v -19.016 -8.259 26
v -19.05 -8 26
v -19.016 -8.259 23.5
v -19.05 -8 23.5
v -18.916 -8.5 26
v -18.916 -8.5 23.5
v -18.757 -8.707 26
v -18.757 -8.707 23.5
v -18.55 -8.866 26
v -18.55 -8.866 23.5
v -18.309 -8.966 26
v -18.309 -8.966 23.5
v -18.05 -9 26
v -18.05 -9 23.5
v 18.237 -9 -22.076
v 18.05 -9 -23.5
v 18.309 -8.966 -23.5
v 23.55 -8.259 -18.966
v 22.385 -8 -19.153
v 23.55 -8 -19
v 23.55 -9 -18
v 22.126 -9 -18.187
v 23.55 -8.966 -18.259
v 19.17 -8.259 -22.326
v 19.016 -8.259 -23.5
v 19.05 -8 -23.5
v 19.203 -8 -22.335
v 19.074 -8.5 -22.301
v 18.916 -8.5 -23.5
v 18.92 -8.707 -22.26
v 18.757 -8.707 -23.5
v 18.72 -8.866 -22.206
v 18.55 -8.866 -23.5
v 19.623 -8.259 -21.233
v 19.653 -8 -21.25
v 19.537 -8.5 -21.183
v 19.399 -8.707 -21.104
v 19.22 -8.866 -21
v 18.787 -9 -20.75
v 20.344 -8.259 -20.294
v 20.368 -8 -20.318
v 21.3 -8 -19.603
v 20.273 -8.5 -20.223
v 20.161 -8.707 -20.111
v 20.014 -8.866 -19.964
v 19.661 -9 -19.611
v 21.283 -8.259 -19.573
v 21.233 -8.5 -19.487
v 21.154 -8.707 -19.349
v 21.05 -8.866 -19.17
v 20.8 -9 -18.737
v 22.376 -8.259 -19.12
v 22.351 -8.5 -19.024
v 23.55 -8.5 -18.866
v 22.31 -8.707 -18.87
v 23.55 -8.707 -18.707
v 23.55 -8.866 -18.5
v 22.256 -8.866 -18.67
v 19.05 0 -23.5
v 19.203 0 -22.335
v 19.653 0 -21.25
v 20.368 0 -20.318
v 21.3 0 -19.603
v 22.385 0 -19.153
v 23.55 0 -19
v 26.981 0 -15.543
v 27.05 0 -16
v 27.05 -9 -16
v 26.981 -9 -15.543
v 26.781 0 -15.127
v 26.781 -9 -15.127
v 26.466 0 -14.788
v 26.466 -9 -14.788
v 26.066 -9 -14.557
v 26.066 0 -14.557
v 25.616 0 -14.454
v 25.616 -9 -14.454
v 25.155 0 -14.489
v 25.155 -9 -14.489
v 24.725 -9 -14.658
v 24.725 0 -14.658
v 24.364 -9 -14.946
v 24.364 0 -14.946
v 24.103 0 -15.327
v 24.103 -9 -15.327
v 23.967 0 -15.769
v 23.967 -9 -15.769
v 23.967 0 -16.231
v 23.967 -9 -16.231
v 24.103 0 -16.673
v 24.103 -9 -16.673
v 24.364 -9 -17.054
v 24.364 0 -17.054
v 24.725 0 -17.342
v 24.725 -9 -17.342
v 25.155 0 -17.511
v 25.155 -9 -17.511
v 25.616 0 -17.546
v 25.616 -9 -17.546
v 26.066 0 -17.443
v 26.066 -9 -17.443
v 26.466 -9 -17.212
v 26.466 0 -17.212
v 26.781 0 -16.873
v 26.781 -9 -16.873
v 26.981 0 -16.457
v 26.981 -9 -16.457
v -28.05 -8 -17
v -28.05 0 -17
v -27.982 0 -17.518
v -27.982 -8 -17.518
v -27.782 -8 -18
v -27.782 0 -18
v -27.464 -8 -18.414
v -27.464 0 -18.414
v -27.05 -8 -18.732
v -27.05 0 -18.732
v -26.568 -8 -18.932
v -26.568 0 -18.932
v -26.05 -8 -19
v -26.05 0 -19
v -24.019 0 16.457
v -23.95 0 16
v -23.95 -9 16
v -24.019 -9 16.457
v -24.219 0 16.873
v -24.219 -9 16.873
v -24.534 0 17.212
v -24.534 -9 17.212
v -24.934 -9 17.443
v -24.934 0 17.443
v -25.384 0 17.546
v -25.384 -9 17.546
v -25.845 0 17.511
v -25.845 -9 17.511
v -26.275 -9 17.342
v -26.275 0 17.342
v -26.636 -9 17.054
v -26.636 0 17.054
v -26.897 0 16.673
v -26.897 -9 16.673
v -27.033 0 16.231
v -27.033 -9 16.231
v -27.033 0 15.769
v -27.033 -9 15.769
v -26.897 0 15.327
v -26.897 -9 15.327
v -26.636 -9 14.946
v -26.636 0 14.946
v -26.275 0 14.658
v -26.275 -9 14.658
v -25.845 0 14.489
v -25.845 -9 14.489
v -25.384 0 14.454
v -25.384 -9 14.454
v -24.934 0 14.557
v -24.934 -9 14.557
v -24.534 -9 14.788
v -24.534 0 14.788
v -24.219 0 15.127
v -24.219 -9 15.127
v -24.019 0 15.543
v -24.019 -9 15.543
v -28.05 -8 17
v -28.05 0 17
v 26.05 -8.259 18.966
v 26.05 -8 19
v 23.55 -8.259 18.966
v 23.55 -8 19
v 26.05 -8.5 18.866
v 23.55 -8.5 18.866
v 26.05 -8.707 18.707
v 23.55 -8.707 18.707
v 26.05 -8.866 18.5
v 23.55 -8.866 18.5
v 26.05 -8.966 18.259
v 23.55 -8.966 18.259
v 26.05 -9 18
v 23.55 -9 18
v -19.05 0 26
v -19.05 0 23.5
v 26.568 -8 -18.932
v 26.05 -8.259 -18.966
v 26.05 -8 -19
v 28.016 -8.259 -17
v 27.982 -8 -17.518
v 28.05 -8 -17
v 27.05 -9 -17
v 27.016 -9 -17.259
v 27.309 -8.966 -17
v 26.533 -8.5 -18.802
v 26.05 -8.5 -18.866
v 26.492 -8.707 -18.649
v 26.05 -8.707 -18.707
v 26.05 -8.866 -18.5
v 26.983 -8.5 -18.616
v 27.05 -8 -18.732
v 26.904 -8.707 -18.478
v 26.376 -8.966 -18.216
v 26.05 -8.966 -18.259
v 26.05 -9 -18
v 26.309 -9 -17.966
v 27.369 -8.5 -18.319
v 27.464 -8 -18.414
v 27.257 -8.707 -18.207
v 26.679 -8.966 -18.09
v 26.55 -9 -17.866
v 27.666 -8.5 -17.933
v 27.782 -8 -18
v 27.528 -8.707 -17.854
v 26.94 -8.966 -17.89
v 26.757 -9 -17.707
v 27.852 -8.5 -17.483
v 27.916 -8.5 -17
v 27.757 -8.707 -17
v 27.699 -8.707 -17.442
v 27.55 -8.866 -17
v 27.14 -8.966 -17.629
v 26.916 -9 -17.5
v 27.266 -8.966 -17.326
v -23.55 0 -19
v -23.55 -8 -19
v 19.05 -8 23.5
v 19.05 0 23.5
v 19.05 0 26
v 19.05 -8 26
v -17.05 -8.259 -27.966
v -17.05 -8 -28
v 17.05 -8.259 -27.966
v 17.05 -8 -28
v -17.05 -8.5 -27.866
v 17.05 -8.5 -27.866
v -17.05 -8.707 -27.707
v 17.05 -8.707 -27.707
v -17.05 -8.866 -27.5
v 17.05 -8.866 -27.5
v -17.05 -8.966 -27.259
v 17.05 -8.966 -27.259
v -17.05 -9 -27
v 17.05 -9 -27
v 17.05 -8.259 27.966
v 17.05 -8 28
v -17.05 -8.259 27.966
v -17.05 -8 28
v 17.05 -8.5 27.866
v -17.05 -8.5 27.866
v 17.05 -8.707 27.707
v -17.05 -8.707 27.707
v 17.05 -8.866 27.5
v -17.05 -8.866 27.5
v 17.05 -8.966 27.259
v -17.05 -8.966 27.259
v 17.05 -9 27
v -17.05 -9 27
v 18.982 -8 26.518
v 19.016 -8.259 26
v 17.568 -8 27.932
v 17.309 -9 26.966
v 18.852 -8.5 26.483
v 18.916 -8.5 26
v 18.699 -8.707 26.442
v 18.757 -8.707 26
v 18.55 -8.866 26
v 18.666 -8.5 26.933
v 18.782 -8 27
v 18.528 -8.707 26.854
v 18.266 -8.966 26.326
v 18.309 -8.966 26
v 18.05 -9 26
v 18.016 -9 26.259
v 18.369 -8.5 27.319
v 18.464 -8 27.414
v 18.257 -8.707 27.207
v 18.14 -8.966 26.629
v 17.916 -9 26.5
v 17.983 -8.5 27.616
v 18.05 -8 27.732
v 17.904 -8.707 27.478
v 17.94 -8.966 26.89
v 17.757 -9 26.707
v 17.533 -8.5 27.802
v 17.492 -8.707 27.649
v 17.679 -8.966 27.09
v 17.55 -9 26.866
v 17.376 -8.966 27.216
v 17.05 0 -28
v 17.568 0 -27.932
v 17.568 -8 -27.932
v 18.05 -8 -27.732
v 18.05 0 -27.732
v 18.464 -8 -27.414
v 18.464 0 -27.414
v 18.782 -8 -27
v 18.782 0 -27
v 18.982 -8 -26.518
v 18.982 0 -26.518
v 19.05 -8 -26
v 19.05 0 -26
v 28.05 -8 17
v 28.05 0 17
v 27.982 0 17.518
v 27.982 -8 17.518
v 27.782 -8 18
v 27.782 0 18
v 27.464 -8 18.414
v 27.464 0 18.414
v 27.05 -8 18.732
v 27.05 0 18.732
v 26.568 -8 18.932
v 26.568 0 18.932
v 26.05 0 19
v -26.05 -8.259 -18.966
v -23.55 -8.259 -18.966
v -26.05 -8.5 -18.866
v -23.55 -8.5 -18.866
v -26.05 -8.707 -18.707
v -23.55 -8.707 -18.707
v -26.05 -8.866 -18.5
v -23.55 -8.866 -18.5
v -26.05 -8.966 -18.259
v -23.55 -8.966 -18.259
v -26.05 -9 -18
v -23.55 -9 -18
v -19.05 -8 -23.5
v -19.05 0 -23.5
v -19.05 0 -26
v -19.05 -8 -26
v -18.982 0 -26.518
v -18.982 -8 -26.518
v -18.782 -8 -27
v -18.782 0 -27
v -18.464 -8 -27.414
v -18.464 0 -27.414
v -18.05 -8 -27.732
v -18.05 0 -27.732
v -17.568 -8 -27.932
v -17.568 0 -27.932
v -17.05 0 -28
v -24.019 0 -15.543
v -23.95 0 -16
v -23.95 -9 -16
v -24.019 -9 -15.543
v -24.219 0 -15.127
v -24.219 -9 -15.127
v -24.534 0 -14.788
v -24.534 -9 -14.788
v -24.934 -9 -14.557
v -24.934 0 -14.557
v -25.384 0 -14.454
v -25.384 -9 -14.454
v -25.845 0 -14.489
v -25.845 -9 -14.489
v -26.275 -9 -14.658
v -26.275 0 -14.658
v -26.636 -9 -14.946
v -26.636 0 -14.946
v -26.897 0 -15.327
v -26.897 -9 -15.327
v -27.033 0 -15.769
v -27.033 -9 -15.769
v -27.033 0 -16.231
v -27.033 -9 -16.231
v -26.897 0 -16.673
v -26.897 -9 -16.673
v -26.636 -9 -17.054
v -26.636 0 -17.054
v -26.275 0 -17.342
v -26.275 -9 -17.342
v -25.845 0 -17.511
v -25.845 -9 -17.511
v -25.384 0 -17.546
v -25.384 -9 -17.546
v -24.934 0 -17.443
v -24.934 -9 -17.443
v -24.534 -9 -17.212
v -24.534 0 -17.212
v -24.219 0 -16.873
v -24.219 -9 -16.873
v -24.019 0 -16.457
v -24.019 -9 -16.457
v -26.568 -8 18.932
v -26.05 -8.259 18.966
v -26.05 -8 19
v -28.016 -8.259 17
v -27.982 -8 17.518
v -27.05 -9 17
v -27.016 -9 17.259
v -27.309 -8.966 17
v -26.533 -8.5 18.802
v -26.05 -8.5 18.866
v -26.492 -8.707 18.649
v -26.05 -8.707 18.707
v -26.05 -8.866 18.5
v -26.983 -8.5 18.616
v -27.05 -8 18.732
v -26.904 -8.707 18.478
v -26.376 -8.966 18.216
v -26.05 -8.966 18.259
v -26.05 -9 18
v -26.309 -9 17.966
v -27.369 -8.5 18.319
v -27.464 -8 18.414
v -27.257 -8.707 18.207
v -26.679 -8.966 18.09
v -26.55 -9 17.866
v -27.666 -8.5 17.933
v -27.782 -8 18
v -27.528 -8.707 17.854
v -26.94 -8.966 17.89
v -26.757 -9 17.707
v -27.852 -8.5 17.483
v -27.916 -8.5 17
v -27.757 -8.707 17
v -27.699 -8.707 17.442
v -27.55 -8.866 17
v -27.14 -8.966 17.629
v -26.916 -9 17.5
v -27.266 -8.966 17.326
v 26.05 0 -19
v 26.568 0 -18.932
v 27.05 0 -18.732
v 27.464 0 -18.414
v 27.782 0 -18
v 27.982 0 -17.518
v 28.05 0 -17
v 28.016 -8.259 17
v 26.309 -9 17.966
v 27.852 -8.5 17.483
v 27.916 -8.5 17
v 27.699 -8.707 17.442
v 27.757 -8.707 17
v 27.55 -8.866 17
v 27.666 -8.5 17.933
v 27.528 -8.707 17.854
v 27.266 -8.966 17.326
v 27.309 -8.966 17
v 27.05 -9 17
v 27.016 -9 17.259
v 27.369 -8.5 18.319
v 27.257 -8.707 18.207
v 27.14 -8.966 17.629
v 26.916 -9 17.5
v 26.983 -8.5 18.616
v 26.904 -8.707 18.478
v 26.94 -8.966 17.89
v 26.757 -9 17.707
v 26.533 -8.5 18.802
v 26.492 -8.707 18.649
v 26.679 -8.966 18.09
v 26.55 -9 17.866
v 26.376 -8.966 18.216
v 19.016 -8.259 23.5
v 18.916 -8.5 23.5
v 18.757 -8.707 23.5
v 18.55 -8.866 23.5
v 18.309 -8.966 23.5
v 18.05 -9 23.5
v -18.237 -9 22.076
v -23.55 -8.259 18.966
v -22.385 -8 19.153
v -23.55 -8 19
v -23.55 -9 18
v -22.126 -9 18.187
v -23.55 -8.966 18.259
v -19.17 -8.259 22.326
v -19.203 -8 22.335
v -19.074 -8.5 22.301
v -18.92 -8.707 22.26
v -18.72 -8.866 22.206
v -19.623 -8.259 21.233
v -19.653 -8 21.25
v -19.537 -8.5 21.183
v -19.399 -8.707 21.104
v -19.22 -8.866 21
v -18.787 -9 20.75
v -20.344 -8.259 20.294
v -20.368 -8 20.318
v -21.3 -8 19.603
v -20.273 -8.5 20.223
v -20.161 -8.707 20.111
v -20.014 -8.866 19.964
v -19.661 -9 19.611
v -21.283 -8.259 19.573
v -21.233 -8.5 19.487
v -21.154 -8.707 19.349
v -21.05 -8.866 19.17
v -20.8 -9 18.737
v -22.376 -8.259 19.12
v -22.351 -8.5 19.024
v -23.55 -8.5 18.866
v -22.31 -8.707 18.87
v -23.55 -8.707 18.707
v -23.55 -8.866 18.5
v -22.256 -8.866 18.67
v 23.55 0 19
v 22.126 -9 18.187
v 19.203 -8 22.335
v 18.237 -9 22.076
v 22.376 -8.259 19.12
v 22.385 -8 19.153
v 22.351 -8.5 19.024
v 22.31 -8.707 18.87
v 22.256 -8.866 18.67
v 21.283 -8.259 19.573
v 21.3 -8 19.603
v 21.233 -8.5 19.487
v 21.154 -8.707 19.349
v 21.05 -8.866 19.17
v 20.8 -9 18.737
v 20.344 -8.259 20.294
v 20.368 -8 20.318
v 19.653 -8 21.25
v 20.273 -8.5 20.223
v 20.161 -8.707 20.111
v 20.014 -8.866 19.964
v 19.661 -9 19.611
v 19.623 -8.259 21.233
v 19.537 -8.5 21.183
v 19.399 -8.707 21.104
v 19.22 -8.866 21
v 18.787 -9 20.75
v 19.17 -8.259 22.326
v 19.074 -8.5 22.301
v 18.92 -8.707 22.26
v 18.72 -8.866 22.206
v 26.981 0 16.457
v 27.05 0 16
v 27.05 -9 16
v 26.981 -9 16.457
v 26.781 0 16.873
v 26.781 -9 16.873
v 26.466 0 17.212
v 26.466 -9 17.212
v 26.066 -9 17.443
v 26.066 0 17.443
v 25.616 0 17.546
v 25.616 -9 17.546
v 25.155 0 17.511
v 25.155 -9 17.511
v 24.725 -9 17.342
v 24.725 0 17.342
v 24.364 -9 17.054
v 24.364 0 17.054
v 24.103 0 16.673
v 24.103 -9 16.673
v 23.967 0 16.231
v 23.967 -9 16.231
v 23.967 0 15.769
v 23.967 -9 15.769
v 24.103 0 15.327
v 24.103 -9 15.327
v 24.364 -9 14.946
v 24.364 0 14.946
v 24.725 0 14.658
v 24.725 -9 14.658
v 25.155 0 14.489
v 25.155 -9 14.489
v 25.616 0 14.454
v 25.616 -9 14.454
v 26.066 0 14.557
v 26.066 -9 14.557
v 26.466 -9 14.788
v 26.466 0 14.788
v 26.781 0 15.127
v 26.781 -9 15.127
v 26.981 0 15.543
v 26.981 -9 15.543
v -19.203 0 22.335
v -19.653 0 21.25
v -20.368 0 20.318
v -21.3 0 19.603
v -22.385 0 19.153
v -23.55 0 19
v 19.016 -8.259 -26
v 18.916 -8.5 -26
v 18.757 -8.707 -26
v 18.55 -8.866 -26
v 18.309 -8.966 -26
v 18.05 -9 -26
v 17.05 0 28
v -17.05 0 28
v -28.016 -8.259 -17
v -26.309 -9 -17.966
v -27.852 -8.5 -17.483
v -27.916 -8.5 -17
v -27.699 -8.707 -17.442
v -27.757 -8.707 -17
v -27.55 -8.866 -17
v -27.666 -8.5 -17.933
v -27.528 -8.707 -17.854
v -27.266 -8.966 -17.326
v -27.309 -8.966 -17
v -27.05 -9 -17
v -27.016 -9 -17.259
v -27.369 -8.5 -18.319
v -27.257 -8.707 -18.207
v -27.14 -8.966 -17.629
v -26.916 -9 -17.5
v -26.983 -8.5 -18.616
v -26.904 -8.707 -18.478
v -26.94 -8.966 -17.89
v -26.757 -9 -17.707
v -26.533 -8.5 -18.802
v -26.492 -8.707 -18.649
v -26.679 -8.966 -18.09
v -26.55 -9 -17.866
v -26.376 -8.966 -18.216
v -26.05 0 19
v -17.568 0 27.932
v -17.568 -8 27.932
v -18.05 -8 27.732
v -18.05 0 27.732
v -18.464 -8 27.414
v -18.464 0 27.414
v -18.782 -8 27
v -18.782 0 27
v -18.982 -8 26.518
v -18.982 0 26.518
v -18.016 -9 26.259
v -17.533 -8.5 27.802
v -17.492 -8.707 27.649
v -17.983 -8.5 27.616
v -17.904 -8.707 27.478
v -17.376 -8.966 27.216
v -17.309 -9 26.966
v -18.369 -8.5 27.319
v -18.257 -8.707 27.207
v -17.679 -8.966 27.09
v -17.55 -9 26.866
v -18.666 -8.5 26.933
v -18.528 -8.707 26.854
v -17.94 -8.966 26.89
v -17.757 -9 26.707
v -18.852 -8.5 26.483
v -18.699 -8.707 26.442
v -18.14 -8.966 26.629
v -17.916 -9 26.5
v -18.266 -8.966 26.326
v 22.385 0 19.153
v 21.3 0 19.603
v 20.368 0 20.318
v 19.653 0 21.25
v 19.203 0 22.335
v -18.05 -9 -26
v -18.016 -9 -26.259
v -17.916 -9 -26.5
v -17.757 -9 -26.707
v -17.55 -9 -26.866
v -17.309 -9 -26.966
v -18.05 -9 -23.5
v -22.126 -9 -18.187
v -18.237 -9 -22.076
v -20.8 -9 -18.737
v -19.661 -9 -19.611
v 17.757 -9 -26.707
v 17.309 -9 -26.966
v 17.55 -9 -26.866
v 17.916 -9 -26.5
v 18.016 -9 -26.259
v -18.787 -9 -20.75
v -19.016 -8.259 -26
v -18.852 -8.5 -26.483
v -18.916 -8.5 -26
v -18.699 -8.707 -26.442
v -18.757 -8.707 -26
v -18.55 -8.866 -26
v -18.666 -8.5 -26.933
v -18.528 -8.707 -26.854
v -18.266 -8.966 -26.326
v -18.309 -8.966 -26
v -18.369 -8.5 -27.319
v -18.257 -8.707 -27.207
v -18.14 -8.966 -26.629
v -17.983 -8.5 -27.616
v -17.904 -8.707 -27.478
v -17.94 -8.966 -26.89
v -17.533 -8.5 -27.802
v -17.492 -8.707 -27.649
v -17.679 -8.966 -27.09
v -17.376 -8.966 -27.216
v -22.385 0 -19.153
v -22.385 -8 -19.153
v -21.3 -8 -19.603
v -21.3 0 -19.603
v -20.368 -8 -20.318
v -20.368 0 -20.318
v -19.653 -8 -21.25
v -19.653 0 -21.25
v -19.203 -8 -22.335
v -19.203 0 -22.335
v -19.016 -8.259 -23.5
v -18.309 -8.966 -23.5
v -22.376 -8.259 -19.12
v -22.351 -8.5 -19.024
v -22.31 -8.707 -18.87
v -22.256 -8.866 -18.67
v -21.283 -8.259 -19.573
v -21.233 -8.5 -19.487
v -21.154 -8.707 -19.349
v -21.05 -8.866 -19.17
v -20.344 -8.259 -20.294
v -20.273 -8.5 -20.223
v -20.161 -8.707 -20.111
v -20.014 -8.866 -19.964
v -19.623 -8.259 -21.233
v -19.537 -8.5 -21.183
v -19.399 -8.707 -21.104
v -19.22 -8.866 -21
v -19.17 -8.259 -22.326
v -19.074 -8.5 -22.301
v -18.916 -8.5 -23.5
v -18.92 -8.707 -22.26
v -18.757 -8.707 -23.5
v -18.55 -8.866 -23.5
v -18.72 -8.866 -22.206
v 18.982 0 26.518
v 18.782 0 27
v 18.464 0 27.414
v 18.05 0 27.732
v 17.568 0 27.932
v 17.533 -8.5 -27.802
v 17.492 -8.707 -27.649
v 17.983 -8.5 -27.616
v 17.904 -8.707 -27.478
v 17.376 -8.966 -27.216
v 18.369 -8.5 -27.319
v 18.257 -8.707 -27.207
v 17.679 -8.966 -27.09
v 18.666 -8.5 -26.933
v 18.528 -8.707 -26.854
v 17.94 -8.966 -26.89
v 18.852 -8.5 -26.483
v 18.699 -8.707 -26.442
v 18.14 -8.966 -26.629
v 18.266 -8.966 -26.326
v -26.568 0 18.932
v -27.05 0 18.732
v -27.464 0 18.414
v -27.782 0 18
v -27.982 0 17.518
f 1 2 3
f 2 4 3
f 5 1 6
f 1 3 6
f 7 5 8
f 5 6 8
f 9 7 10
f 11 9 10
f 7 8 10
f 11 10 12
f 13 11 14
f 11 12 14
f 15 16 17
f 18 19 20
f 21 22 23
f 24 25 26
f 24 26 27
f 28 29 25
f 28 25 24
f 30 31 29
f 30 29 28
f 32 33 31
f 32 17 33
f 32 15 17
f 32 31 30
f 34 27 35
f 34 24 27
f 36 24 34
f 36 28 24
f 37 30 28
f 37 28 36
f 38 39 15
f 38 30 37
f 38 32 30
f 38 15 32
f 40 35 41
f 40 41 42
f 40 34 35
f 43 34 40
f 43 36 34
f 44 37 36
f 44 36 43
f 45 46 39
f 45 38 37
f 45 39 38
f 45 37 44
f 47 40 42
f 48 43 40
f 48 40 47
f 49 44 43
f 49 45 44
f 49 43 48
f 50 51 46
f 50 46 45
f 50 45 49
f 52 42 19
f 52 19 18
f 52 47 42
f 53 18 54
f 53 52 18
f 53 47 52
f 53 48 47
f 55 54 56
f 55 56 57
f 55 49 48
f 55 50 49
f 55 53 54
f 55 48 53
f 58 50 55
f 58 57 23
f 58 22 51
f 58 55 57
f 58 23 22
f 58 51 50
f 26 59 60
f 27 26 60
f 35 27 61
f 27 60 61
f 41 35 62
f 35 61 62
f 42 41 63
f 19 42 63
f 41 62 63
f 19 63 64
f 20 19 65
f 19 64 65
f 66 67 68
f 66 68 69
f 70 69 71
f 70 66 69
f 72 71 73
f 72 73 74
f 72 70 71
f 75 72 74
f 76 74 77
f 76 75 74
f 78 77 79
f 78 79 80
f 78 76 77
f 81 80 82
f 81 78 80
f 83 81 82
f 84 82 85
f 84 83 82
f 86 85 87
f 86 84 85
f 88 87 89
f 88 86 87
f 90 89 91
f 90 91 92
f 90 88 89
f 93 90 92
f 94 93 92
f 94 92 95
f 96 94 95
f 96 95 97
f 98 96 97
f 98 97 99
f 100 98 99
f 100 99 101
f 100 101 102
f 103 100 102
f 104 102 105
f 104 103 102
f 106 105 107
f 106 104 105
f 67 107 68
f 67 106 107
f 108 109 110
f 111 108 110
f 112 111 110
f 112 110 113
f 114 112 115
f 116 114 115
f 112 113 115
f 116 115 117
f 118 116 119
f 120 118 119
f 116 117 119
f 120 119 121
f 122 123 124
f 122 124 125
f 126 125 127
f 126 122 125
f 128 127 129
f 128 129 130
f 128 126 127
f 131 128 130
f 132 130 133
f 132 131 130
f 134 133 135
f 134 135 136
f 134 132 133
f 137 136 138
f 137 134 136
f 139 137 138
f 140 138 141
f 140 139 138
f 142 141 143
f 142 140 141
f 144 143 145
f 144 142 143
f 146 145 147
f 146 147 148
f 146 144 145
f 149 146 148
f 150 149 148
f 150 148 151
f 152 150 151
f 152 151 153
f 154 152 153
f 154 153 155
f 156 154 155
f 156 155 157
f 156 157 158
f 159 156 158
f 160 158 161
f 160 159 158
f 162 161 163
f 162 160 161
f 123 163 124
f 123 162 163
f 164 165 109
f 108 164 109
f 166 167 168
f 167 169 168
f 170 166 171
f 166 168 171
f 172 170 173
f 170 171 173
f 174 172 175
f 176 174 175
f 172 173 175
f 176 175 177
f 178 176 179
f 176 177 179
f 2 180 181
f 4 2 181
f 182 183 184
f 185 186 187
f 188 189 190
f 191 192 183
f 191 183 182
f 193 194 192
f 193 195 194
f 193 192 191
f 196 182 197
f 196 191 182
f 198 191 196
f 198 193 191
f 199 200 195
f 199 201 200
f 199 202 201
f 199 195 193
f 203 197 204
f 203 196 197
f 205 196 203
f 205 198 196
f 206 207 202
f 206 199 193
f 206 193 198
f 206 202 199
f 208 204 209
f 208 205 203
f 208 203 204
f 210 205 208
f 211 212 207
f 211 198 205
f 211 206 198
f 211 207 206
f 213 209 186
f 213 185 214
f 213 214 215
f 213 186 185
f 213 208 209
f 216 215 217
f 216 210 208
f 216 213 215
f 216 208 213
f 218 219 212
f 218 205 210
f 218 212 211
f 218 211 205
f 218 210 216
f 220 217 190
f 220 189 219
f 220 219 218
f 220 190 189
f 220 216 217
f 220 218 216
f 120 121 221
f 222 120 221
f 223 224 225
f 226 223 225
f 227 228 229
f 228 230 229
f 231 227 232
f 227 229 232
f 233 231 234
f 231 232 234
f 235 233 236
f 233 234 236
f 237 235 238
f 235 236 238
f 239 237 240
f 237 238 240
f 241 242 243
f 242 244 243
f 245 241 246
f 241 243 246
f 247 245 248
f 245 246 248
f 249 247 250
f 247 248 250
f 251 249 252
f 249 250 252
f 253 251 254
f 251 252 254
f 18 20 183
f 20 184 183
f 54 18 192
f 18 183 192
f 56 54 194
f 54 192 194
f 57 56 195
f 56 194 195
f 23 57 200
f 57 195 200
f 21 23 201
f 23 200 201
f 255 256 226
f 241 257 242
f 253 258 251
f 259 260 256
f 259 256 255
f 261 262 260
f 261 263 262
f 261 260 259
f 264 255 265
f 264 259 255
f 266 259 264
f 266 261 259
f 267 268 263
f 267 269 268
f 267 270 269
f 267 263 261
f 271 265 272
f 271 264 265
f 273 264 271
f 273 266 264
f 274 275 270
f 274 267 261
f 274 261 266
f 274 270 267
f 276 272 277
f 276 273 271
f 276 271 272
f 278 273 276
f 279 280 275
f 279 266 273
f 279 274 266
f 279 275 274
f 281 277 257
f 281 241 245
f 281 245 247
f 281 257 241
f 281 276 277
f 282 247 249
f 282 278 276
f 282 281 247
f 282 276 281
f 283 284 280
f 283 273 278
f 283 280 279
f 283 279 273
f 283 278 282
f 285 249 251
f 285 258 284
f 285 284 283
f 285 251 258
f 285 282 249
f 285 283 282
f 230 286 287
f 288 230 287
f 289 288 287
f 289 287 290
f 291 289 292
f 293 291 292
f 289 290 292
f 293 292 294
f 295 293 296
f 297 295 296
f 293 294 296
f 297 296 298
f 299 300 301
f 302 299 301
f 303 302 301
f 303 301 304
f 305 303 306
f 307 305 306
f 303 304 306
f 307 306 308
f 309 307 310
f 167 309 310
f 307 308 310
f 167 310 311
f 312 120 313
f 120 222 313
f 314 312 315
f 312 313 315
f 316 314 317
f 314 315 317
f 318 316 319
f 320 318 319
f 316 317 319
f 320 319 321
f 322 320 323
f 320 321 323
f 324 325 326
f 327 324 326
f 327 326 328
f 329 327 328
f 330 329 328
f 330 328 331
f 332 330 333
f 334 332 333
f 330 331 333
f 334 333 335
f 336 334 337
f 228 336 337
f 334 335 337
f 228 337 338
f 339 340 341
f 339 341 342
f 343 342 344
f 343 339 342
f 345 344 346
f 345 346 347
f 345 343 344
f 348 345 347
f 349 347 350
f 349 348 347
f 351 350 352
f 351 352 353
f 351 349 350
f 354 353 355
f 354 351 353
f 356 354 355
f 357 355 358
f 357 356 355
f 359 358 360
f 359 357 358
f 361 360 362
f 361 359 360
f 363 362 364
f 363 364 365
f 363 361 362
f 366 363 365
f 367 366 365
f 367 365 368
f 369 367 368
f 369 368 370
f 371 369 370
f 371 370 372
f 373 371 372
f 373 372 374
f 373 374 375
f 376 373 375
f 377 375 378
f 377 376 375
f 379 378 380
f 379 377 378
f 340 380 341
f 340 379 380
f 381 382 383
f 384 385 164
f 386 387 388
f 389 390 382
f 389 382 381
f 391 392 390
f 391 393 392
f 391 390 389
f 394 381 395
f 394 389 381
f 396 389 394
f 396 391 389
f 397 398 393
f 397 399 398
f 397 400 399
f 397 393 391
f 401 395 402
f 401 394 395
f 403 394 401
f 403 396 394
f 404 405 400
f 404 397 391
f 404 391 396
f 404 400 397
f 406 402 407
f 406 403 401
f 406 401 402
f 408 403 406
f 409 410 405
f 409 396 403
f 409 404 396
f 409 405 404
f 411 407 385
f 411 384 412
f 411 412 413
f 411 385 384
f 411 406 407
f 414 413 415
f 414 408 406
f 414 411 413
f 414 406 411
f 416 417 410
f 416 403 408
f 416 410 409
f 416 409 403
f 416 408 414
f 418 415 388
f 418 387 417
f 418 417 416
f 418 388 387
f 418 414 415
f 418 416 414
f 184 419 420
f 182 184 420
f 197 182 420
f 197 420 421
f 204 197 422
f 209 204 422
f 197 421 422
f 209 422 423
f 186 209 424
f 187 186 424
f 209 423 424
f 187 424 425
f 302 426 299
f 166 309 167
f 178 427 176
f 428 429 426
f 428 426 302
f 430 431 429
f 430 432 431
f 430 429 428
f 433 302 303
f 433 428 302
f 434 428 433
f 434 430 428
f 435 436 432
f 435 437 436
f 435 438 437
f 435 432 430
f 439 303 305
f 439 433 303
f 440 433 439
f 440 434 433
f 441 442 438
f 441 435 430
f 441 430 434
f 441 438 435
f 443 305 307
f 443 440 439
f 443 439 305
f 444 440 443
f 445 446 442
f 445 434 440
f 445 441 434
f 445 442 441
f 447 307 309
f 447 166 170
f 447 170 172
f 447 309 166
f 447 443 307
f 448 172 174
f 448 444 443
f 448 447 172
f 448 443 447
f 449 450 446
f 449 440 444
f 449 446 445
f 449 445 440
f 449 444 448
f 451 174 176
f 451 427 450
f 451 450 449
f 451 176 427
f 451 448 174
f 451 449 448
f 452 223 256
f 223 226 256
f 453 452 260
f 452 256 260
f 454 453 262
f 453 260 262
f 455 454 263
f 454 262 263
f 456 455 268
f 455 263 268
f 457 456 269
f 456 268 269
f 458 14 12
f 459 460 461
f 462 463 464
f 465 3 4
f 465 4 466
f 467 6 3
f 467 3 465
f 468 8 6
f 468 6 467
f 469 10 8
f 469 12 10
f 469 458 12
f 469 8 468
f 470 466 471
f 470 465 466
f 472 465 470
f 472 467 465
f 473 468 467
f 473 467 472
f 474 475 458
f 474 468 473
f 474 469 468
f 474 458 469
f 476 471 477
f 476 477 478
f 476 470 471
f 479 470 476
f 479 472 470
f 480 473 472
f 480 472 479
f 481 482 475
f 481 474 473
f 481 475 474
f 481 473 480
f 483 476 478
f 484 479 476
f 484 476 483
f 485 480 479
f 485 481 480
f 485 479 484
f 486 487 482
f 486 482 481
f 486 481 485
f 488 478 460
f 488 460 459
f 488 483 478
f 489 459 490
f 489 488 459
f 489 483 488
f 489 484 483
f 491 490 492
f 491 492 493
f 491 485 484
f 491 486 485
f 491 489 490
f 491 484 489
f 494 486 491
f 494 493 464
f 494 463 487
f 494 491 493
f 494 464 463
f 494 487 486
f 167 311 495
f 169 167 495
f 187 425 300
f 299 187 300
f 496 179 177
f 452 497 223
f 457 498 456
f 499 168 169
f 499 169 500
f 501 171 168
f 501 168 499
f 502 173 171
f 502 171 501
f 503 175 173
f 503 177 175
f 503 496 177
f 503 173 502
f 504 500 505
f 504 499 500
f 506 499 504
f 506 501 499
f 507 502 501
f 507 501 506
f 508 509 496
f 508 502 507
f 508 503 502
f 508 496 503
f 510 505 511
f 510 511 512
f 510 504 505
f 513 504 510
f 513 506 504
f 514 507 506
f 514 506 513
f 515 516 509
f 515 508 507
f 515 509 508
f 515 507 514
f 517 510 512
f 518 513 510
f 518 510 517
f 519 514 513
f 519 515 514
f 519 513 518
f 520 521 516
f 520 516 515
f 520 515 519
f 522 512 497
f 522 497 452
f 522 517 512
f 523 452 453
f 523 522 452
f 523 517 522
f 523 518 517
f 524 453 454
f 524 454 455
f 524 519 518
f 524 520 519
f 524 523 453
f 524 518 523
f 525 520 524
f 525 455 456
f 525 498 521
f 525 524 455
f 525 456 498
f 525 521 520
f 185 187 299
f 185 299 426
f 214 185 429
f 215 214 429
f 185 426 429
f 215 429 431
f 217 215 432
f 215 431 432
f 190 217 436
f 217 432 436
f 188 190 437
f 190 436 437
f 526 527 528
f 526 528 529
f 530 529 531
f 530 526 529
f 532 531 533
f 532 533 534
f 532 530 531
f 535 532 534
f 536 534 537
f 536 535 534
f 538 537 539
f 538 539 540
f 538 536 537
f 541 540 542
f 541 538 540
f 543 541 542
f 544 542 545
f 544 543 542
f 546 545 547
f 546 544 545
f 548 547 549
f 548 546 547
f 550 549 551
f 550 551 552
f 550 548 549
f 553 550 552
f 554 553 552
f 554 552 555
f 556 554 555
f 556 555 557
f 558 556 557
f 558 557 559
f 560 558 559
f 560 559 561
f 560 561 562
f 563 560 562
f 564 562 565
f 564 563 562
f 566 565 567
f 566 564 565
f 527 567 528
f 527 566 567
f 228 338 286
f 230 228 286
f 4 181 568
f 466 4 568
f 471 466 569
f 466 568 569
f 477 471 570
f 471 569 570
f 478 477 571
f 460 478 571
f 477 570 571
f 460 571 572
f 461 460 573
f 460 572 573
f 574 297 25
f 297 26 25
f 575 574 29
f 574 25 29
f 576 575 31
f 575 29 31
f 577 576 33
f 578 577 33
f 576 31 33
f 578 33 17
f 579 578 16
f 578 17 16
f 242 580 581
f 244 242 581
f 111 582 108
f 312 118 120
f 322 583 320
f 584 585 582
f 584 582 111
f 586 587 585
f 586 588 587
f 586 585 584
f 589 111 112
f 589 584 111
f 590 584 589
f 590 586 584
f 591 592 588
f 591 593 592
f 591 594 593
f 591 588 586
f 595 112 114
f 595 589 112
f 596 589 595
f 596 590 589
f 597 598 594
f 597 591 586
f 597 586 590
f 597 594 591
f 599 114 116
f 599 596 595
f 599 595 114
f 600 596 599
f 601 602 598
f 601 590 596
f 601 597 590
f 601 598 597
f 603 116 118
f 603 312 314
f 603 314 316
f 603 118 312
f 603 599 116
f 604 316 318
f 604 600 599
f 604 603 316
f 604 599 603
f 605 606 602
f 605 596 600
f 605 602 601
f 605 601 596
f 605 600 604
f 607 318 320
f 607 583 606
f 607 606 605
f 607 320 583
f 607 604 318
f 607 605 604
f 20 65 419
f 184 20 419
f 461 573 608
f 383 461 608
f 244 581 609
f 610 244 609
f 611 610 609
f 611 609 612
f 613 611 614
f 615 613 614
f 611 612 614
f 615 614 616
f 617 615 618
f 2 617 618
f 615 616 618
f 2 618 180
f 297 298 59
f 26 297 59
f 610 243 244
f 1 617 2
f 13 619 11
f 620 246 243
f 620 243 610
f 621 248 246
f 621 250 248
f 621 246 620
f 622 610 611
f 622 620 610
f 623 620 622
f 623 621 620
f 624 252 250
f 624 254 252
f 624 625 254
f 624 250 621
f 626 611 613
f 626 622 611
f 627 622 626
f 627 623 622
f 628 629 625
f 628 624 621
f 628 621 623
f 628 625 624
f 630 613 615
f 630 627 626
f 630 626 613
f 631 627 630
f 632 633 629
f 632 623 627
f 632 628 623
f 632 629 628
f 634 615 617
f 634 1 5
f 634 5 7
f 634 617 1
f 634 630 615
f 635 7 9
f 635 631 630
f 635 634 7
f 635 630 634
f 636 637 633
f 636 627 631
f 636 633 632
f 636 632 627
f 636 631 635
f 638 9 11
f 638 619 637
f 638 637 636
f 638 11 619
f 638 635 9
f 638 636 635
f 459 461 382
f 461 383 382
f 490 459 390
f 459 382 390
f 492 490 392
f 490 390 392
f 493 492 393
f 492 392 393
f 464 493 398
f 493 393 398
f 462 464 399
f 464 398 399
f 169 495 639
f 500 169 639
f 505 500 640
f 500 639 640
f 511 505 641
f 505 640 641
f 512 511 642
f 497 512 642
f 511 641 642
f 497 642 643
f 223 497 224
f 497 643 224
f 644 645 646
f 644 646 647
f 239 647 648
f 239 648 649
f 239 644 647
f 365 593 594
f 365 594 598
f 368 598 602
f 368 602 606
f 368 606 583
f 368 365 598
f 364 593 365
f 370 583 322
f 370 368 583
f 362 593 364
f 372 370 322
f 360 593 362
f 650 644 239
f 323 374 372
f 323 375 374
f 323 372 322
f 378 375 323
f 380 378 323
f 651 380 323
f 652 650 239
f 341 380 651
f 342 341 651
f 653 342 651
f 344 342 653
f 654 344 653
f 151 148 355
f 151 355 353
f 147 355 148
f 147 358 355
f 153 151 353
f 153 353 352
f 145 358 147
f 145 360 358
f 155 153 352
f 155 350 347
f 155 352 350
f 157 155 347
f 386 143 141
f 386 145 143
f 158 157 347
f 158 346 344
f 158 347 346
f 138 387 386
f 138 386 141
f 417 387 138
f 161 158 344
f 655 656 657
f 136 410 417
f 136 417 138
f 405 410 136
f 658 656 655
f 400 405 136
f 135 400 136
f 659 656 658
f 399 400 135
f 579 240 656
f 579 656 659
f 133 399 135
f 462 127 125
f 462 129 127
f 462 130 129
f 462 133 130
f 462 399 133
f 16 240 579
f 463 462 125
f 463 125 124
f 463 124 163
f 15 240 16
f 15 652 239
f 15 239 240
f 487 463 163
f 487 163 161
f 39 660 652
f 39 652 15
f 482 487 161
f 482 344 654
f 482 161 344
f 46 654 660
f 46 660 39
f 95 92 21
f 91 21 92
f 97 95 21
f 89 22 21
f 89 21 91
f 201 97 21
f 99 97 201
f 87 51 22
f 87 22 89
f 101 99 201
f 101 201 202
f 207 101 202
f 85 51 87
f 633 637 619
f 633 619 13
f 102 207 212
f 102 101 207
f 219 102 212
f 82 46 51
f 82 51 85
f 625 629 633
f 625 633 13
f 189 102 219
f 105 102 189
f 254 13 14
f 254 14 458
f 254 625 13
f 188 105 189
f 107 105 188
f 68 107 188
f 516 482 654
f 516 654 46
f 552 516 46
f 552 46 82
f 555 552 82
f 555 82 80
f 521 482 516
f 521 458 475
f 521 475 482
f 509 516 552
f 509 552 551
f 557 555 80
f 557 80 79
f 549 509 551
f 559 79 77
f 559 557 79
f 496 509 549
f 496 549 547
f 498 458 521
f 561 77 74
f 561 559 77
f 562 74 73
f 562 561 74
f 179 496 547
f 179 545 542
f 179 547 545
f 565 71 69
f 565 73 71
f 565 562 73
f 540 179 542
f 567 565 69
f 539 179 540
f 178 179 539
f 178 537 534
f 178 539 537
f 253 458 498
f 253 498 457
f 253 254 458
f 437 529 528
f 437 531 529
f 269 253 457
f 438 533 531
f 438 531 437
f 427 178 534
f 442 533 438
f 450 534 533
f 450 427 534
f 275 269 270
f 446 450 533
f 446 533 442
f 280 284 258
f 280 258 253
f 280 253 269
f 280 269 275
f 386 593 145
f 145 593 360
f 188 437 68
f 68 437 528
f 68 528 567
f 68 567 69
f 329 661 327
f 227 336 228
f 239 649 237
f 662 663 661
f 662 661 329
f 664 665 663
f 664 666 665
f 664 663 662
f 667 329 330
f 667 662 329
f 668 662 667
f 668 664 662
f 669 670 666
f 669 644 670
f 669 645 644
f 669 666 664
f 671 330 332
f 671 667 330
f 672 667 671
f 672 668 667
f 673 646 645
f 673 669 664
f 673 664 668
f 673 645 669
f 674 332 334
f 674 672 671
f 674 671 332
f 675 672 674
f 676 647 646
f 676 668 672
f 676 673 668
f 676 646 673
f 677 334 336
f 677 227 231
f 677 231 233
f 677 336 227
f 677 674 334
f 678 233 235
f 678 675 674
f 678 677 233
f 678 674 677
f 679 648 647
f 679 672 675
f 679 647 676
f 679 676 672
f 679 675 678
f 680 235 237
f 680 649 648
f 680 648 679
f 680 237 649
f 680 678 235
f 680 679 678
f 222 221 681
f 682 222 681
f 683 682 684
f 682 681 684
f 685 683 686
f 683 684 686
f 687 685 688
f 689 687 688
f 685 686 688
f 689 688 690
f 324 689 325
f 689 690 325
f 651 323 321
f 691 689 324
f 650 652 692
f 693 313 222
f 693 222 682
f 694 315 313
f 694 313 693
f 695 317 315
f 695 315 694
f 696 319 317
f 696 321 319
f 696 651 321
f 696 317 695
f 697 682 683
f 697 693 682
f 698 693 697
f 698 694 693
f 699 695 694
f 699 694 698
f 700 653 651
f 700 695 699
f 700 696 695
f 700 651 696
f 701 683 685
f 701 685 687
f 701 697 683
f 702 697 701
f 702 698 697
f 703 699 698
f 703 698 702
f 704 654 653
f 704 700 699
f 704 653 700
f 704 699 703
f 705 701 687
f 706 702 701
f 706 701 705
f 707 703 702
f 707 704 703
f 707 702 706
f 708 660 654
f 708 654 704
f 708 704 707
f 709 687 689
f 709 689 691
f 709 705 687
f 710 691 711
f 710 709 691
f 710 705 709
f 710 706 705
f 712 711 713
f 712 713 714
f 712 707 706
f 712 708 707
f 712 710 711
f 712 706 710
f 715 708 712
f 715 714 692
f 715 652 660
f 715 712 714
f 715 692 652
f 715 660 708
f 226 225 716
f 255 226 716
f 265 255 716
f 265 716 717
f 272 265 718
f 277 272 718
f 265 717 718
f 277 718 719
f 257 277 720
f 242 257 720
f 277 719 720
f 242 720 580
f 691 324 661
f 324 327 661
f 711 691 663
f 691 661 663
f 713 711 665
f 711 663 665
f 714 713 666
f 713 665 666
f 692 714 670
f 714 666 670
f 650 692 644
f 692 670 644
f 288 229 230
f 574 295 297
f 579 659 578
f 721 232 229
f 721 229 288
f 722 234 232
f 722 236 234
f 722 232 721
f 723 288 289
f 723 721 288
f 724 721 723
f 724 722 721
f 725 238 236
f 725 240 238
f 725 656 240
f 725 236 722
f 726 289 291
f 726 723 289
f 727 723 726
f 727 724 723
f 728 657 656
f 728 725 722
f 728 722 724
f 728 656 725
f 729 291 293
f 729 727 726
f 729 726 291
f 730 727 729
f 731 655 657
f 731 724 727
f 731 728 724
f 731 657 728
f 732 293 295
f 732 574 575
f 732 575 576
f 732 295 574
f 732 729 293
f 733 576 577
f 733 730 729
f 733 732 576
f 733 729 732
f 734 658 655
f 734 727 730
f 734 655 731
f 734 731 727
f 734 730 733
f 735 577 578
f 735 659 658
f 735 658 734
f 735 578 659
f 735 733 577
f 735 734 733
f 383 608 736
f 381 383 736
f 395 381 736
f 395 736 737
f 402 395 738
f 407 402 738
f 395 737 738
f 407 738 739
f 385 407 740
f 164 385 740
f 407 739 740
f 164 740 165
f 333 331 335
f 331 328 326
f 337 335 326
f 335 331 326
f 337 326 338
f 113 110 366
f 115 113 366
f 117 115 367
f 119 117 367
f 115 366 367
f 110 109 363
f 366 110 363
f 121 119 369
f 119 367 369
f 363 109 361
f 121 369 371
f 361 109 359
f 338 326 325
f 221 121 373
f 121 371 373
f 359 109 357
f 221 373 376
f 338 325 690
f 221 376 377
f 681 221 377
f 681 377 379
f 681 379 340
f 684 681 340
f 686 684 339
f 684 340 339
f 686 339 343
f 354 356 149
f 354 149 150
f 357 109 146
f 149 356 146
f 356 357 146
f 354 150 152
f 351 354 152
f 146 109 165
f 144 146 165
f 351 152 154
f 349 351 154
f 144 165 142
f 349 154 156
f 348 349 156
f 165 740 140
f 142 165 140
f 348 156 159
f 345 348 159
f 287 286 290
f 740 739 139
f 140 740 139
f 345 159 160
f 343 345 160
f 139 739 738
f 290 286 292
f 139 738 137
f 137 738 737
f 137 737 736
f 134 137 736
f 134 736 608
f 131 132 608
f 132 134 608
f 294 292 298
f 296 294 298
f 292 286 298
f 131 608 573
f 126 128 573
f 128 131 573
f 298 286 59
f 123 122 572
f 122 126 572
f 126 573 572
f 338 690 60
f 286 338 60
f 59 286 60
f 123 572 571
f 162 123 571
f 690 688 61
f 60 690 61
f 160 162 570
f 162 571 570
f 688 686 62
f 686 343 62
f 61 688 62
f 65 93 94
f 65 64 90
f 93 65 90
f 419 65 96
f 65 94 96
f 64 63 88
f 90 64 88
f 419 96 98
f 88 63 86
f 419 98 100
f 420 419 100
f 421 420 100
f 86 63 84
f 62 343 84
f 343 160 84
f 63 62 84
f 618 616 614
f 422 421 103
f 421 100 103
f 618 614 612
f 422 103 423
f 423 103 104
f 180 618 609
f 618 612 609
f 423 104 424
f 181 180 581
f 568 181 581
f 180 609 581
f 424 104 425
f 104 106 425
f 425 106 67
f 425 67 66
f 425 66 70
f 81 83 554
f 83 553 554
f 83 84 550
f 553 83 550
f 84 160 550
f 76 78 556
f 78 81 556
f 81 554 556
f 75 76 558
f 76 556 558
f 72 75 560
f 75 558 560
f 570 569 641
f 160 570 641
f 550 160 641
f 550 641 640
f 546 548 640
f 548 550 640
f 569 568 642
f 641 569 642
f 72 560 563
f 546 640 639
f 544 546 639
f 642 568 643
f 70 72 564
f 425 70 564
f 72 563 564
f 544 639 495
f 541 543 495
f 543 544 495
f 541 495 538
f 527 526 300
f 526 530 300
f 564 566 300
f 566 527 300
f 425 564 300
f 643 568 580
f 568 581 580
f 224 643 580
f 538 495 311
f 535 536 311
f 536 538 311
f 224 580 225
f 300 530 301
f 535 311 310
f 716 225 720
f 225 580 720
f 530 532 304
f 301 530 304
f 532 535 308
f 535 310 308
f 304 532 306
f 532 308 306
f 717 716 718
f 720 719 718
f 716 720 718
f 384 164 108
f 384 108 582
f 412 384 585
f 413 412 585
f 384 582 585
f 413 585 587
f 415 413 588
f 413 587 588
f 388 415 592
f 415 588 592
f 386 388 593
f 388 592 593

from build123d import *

# Parameters (mm, degrees)
F0_R     = 1.55
F1_DEPTH = 9
F2_R     = 0.99999


# Not quite as in the source:
# - a fillet or chamfer is up to 0.001 mm smaller than in the source, because OpenCascade refuses the exact size


with BuildPart() as f1:
    # F0 (on Front) → F1 (new body)
    with BuildSketch(Plane.XZ):
        with BuildLine():
            Line((17.05, 28), (-17.05, 28))
            ThreePointArc((-17.05, 28), (-18.4642135624, 27.4142135624), (-19.05, 26))
            Line((-19.05, 26), (-19.05, 23.5))
            ThreePointArc((-19.05, 23.5), (-20.3680194847, 20.3180194847), (-23.55, 19))
            Line((-23.55, 19), (-26.05, 19))
            ThreePointArc((-26.05, 19), (-27.4642135624, 18.4142135624), (-28.05, 17))
            Line((-28.05, 17), (-28.05, -17))
            ThreePointArc((-28.05, -17), (-27.4642135624, -18.4142135624), (-26.05, -19))
            Line((-26.05, -19), (-23.55, -19))
            ThreePointArc((-23.55, -19), (-20.3680194847, -20.3180194847), (-19.05, -23.5))
            Line((-19.05, -23.5), (-19.05, -26))
            ThreePointArc((-19.05, -26), (-18.4642135624, -27.4142135624), (-17.05, -28))
            Line((-17.05, -28), (17.05, -28))
            ThreePointArc((17.05, -28), (18.4642135624, -27.4142135624), (19.05, -26))
            Line((19.05, -26), (19.05, -23.5))
            ThreePointArc((19.05, -23.5), (20.3680194847, -20.3180194847), (23.55, -19))
            Line((23.55, -19), (26.05, -19))
            ThreePointArc((26.05, -19), (27.4642135624, -18.4142135624), (28.05, -17))
            Line((28.05, -17), (28.05, 17))
            ThreePointArc((28.05, 17), (27.4642135624, 18.4142135624), (26.05, 19))
            Line((26.05, 19), (23.55, 19))
            ThreePointArc((23.55, 19), (20.3680194847, 20.3180194847), (19.05, 23.5))
            Line((19.05, 23.5), (19.05, 26))
            ThreePointArc((19.05, 26), (18.4642135624, 27.4142135624), (17.05, 28))
        make_face()
        with Locations((-25.5, -16)):
            Circle(F0_R, mode=Mode.SUBTRACT)
        with Locations((25.5, -16)):
            Circle(F0_R, mode=Mode.SUBTRACT)
        with Locations((-25.5, 16)):
            Circle(F0_R, mode=Mode.SUBTRACT)
        with Locations((25.5, 16)):
            Circle(F0_R, mode=Mode.SUBTRACT)
    extrude(amount=F1_DEPTH)

    # F2 (radius 1 in the source; OpenCascade refuses exactly that, so slightly less here)
    f2_edges = [f1.edges().sort_by_distance(p)[0] for p in [
        (-27.464214, -9, 18.414214),
    ]]
    fillet(f2_edges, radius=F2_R)


solid = f1.part
